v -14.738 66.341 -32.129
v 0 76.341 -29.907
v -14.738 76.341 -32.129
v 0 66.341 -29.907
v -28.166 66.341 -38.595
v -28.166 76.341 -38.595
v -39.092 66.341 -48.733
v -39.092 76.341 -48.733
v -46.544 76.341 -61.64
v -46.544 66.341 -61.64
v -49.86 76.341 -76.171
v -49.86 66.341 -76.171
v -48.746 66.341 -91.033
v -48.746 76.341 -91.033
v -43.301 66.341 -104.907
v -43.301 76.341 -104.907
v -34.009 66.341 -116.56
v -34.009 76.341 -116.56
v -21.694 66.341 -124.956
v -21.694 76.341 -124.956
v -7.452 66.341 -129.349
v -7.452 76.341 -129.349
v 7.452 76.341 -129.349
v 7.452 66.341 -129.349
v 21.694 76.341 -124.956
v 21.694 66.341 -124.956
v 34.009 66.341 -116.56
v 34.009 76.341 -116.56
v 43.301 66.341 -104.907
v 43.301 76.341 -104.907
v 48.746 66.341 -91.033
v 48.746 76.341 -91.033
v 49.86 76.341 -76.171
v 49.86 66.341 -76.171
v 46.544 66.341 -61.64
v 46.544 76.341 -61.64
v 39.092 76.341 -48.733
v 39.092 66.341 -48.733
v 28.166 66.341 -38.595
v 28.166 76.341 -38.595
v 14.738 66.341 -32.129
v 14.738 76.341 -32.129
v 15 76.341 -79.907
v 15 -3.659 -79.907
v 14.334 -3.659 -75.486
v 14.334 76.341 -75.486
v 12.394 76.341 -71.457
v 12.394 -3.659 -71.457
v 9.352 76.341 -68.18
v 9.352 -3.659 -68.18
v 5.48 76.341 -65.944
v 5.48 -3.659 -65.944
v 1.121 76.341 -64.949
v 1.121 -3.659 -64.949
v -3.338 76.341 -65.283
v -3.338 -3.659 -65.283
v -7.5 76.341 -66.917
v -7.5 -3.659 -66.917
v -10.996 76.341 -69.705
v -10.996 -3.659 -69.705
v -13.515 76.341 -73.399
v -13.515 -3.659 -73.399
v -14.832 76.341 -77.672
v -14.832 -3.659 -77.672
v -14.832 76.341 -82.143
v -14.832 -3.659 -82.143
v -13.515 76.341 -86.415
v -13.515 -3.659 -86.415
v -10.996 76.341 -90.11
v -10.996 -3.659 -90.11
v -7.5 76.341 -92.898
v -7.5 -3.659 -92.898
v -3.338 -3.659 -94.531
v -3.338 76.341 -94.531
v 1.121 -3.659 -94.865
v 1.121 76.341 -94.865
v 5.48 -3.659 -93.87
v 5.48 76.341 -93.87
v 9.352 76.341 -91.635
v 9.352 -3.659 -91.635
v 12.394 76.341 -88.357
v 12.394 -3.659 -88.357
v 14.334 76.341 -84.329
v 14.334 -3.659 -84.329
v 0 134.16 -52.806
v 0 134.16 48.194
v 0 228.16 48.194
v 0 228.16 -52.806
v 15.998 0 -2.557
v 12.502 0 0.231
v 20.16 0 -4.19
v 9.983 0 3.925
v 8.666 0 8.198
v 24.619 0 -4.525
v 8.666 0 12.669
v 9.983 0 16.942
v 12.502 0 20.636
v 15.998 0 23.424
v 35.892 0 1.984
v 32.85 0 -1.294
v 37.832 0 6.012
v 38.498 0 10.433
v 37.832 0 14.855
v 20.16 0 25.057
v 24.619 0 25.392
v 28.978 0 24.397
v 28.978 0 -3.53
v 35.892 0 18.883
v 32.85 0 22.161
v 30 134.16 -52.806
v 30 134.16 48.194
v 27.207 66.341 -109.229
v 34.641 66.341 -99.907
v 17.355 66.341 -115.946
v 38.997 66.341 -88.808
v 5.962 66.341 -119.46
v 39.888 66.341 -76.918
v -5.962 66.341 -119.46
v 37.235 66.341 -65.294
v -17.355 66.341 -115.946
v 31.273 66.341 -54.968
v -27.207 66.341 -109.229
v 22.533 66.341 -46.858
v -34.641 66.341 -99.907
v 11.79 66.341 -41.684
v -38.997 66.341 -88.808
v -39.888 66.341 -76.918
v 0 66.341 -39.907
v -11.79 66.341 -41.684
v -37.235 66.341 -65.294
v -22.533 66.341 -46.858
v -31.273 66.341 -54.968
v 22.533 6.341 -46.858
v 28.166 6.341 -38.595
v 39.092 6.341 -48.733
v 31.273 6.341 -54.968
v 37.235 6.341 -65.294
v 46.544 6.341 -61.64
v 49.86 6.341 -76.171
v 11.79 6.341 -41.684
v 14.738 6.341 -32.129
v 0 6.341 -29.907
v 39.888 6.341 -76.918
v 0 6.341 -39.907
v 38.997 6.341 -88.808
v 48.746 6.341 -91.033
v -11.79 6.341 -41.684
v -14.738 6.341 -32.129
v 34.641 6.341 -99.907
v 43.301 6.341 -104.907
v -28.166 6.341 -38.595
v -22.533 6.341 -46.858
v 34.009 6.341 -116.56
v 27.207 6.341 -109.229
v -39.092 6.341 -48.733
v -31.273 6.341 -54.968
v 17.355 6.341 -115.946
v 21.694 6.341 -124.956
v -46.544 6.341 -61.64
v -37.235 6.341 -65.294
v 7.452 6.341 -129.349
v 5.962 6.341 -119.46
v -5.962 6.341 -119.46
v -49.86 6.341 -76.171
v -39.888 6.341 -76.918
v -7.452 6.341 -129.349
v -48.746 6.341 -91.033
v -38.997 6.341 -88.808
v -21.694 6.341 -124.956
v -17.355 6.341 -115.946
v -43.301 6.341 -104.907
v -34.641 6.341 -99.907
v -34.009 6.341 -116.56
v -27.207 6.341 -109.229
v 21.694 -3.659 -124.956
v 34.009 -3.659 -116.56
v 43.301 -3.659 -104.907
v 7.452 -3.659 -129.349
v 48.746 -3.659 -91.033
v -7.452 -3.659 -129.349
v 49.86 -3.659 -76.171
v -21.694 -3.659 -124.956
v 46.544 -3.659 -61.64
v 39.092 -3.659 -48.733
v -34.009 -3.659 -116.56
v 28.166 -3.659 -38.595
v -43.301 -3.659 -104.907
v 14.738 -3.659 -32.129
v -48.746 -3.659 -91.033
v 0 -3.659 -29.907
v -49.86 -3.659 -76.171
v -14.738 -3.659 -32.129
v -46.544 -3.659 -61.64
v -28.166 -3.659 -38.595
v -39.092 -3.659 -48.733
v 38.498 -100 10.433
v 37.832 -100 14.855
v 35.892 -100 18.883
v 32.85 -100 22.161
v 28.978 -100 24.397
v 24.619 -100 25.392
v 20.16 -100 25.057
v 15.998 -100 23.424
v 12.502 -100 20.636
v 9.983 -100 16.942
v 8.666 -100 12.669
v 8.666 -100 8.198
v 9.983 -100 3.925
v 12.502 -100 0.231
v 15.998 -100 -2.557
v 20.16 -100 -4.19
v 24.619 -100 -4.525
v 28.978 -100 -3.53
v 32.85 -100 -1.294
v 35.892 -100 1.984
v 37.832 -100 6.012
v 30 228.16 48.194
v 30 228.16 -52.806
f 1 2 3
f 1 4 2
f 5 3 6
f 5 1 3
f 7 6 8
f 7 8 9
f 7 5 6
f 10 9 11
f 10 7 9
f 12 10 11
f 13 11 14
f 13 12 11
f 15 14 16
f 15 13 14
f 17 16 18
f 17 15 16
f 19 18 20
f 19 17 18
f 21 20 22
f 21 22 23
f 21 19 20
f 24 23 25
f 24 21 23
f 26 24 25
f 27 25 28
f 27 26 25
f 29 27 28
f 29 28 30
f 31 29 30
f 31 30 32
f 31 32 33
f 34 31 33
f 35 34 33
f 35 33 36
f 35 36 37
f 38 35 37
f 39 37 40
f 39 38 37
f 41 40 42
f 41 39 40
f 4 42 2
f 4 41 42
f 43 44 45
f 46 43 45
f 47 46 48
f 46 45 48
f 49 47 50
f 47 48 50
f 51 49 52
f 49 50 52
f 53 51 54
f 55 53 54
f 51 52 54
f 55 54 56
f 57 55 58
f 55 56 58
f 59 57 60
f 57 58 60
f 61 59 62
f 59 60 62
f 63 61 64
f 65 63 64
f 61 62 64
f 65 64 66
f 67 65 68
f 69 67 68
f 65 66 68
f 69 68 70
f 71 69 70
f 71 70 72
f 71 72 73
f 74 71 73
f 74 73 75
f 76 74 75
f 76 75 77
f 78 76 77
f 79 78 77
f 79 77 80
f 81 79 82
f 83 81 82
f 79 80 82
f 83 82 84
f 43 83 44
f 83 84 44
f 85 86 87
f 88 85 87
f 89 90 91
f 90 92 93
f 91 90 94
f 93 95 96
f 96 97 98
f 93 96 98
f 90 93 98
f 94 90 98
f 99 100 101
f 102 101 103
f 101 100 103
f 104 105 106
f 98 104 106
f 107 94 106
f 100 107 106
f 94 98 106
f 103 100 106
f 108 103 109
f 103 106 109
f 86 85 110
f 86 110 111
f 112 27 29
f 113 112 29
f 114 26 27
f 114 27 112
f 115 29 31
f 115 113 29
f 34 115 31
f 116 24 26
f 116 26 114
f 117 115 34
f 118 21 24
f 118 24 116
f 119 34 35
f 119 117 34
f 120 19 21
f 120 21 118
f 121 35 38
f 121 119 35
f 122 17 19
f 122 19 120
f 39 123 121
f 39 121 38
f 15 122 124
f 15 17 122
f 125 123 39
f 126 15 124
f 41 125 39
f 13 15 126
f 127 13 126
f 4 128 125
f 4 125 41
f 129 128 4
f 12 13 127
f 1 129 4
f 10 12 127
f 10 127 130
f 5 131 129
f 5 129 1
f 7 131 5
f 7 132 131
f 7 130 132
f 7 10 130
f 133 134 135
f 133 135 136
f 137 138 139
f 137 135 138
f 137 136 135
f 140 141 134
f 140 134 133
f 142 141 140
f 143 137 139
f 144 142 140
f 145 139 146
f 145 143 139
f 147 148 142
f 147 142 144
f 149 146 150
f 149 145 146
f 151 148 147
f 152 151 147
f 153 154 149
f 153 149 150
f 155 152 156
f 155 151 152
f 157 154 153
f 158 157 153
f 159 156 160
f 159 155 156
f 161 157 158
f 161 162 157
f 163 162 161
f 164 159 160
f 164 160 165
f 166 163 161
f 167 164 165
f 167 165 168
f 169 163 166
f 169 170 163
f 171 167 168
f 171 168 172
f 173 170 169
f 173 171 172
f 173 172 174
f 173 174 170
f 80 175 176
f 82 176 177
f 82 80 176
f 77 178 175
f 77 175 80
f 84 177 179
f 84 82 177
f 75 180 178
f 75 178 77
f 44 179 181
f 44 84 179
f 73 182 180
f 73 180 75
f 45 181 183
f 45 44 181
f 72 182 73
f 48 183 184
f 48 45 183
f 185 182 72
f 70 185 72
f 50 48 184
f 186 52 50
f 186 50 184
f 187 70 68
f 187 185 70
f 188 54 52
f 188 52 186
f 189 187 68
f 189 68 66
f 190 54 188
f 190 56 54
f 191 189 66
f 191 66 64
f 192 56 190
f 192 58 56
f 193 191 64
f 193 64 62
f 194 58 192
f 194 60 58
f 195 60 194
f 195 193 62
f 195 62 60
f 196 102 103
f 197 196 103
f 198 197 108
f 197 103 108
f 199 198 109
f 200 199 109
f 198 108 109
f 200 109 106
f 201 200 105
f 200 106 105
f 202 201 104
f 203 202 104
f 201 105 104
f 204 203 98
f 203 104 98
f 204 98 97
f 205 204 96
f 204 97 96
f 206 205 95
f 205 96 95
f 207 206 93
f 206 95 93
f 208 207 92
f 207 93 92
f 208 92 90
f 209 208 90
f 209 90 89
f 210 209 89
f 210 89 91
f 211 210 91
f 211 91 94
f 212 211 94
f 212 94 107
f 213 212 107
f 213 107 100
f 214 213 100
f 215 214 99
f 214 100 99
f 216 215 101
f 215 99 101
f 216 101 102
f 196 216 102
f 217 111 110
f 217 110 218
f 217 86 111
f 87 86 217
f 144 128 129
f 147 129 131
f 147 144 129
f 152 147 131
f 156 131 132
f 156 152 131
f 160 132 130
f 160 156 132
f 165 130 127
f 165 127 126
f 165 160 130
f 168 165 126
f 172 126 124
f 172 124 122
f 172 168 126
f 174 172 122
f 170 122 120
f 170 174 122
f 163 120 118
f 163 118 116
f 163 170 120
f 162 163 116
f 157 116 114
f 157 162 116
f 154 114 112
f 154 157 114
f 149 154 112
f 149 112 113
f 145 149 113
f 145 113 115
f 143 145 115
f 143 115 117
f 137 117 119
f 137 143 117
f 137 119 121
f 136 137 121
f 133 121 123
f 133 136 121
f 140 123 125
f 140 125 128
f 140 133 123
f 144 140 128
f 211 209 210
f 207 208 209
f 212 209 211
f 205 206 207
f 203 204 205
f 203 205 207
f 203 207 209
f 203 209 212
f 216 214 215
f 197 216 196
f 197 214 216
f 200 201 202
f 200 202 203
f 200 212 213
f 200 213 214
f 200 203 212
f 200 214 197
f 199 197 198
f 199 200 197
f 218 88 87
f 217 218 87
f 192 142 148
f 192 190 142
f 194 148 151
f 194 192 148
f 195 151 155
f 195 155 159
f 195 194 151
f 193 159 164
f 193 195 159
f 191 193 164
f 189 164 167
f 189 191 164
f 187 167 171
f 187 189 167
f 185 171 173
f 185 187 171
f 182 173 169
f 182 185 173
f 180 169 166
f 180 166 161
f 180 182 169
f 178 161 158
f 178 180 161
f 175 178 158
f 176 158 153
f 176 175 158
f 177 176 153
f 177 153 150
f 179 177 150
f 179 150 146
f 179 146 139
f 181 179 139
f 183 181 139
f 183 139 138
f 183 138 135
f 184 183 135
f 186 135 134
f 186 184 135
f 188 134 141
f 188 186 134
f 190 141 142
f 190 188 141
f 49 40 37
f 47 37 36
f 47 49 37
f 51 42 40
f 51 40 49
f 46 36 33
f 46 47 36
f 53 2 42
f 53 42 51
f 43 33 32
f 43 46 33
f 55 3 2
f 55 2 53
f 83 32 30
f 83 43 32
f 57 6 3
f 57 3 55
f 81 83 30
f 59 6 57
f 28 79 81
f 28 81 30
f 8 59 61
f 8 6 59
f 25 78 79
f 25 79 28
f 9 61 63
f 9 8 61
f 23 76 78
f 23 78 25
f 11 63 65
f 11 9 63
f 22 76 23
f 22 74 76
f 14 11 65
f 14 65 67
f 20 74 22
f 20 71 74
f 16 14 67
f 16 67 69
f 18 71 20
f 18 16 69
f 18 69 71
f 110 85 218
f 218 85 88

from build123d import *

# Parameters (mm, degrees)
F0_R     = 15
F1_DEPTH = 100
F4_R     = 15
F5_DEPTH = 80
F6_W     = 94
F6_H     = 101
F7_DEPTH = 30


with BuildPart() as f1:
    # F0 (on Front) → F1 (new body)
    with BuildSketch(Plane.XZ):
        with Locations((23.497986, 10.433468)):
            Circle(F0_R)
    extrude(amount=F1_DEPTH)


with BuildPart() as f3:
    # F2 (on Right) → F3 (revolve)
    with BuildSketch(Plane.YZ):
        Polygon((-3.658543, -29.907176), (-3.658543, -79.907176), (76.341457, -79.907176), (76.341457, -29.907176), (66.341457, -29.907176), (66.341457, -39.907176), (6.341457, -39.907176), (6.341457, -29.907176), align=None)
    revolve(axis=Axis((0, 36.341457, -79.907176), (0, -1, 0)))

    # F4 (on face) → F5 (cut)
    with BuildSketch(Plane.XZ.offset(3.658543)):
        with Locations((0, -79.907176)):
            Circle(F4_R)
    extrude(amount=-F5_DEPTH, mode=Mode.SUBTRACT)


with BuildPart() as f7:
    # F6 (on Right) → F7 (new body)
    with BuildSketch(Plane.YZ):
        with Locations((181.160161, -2.306005)):
            Rectangle(F6_W, F6_H)
    extrude(amount=F7_DEPTH)


solid = Compound([f1.part, f3.part, f7.part])
